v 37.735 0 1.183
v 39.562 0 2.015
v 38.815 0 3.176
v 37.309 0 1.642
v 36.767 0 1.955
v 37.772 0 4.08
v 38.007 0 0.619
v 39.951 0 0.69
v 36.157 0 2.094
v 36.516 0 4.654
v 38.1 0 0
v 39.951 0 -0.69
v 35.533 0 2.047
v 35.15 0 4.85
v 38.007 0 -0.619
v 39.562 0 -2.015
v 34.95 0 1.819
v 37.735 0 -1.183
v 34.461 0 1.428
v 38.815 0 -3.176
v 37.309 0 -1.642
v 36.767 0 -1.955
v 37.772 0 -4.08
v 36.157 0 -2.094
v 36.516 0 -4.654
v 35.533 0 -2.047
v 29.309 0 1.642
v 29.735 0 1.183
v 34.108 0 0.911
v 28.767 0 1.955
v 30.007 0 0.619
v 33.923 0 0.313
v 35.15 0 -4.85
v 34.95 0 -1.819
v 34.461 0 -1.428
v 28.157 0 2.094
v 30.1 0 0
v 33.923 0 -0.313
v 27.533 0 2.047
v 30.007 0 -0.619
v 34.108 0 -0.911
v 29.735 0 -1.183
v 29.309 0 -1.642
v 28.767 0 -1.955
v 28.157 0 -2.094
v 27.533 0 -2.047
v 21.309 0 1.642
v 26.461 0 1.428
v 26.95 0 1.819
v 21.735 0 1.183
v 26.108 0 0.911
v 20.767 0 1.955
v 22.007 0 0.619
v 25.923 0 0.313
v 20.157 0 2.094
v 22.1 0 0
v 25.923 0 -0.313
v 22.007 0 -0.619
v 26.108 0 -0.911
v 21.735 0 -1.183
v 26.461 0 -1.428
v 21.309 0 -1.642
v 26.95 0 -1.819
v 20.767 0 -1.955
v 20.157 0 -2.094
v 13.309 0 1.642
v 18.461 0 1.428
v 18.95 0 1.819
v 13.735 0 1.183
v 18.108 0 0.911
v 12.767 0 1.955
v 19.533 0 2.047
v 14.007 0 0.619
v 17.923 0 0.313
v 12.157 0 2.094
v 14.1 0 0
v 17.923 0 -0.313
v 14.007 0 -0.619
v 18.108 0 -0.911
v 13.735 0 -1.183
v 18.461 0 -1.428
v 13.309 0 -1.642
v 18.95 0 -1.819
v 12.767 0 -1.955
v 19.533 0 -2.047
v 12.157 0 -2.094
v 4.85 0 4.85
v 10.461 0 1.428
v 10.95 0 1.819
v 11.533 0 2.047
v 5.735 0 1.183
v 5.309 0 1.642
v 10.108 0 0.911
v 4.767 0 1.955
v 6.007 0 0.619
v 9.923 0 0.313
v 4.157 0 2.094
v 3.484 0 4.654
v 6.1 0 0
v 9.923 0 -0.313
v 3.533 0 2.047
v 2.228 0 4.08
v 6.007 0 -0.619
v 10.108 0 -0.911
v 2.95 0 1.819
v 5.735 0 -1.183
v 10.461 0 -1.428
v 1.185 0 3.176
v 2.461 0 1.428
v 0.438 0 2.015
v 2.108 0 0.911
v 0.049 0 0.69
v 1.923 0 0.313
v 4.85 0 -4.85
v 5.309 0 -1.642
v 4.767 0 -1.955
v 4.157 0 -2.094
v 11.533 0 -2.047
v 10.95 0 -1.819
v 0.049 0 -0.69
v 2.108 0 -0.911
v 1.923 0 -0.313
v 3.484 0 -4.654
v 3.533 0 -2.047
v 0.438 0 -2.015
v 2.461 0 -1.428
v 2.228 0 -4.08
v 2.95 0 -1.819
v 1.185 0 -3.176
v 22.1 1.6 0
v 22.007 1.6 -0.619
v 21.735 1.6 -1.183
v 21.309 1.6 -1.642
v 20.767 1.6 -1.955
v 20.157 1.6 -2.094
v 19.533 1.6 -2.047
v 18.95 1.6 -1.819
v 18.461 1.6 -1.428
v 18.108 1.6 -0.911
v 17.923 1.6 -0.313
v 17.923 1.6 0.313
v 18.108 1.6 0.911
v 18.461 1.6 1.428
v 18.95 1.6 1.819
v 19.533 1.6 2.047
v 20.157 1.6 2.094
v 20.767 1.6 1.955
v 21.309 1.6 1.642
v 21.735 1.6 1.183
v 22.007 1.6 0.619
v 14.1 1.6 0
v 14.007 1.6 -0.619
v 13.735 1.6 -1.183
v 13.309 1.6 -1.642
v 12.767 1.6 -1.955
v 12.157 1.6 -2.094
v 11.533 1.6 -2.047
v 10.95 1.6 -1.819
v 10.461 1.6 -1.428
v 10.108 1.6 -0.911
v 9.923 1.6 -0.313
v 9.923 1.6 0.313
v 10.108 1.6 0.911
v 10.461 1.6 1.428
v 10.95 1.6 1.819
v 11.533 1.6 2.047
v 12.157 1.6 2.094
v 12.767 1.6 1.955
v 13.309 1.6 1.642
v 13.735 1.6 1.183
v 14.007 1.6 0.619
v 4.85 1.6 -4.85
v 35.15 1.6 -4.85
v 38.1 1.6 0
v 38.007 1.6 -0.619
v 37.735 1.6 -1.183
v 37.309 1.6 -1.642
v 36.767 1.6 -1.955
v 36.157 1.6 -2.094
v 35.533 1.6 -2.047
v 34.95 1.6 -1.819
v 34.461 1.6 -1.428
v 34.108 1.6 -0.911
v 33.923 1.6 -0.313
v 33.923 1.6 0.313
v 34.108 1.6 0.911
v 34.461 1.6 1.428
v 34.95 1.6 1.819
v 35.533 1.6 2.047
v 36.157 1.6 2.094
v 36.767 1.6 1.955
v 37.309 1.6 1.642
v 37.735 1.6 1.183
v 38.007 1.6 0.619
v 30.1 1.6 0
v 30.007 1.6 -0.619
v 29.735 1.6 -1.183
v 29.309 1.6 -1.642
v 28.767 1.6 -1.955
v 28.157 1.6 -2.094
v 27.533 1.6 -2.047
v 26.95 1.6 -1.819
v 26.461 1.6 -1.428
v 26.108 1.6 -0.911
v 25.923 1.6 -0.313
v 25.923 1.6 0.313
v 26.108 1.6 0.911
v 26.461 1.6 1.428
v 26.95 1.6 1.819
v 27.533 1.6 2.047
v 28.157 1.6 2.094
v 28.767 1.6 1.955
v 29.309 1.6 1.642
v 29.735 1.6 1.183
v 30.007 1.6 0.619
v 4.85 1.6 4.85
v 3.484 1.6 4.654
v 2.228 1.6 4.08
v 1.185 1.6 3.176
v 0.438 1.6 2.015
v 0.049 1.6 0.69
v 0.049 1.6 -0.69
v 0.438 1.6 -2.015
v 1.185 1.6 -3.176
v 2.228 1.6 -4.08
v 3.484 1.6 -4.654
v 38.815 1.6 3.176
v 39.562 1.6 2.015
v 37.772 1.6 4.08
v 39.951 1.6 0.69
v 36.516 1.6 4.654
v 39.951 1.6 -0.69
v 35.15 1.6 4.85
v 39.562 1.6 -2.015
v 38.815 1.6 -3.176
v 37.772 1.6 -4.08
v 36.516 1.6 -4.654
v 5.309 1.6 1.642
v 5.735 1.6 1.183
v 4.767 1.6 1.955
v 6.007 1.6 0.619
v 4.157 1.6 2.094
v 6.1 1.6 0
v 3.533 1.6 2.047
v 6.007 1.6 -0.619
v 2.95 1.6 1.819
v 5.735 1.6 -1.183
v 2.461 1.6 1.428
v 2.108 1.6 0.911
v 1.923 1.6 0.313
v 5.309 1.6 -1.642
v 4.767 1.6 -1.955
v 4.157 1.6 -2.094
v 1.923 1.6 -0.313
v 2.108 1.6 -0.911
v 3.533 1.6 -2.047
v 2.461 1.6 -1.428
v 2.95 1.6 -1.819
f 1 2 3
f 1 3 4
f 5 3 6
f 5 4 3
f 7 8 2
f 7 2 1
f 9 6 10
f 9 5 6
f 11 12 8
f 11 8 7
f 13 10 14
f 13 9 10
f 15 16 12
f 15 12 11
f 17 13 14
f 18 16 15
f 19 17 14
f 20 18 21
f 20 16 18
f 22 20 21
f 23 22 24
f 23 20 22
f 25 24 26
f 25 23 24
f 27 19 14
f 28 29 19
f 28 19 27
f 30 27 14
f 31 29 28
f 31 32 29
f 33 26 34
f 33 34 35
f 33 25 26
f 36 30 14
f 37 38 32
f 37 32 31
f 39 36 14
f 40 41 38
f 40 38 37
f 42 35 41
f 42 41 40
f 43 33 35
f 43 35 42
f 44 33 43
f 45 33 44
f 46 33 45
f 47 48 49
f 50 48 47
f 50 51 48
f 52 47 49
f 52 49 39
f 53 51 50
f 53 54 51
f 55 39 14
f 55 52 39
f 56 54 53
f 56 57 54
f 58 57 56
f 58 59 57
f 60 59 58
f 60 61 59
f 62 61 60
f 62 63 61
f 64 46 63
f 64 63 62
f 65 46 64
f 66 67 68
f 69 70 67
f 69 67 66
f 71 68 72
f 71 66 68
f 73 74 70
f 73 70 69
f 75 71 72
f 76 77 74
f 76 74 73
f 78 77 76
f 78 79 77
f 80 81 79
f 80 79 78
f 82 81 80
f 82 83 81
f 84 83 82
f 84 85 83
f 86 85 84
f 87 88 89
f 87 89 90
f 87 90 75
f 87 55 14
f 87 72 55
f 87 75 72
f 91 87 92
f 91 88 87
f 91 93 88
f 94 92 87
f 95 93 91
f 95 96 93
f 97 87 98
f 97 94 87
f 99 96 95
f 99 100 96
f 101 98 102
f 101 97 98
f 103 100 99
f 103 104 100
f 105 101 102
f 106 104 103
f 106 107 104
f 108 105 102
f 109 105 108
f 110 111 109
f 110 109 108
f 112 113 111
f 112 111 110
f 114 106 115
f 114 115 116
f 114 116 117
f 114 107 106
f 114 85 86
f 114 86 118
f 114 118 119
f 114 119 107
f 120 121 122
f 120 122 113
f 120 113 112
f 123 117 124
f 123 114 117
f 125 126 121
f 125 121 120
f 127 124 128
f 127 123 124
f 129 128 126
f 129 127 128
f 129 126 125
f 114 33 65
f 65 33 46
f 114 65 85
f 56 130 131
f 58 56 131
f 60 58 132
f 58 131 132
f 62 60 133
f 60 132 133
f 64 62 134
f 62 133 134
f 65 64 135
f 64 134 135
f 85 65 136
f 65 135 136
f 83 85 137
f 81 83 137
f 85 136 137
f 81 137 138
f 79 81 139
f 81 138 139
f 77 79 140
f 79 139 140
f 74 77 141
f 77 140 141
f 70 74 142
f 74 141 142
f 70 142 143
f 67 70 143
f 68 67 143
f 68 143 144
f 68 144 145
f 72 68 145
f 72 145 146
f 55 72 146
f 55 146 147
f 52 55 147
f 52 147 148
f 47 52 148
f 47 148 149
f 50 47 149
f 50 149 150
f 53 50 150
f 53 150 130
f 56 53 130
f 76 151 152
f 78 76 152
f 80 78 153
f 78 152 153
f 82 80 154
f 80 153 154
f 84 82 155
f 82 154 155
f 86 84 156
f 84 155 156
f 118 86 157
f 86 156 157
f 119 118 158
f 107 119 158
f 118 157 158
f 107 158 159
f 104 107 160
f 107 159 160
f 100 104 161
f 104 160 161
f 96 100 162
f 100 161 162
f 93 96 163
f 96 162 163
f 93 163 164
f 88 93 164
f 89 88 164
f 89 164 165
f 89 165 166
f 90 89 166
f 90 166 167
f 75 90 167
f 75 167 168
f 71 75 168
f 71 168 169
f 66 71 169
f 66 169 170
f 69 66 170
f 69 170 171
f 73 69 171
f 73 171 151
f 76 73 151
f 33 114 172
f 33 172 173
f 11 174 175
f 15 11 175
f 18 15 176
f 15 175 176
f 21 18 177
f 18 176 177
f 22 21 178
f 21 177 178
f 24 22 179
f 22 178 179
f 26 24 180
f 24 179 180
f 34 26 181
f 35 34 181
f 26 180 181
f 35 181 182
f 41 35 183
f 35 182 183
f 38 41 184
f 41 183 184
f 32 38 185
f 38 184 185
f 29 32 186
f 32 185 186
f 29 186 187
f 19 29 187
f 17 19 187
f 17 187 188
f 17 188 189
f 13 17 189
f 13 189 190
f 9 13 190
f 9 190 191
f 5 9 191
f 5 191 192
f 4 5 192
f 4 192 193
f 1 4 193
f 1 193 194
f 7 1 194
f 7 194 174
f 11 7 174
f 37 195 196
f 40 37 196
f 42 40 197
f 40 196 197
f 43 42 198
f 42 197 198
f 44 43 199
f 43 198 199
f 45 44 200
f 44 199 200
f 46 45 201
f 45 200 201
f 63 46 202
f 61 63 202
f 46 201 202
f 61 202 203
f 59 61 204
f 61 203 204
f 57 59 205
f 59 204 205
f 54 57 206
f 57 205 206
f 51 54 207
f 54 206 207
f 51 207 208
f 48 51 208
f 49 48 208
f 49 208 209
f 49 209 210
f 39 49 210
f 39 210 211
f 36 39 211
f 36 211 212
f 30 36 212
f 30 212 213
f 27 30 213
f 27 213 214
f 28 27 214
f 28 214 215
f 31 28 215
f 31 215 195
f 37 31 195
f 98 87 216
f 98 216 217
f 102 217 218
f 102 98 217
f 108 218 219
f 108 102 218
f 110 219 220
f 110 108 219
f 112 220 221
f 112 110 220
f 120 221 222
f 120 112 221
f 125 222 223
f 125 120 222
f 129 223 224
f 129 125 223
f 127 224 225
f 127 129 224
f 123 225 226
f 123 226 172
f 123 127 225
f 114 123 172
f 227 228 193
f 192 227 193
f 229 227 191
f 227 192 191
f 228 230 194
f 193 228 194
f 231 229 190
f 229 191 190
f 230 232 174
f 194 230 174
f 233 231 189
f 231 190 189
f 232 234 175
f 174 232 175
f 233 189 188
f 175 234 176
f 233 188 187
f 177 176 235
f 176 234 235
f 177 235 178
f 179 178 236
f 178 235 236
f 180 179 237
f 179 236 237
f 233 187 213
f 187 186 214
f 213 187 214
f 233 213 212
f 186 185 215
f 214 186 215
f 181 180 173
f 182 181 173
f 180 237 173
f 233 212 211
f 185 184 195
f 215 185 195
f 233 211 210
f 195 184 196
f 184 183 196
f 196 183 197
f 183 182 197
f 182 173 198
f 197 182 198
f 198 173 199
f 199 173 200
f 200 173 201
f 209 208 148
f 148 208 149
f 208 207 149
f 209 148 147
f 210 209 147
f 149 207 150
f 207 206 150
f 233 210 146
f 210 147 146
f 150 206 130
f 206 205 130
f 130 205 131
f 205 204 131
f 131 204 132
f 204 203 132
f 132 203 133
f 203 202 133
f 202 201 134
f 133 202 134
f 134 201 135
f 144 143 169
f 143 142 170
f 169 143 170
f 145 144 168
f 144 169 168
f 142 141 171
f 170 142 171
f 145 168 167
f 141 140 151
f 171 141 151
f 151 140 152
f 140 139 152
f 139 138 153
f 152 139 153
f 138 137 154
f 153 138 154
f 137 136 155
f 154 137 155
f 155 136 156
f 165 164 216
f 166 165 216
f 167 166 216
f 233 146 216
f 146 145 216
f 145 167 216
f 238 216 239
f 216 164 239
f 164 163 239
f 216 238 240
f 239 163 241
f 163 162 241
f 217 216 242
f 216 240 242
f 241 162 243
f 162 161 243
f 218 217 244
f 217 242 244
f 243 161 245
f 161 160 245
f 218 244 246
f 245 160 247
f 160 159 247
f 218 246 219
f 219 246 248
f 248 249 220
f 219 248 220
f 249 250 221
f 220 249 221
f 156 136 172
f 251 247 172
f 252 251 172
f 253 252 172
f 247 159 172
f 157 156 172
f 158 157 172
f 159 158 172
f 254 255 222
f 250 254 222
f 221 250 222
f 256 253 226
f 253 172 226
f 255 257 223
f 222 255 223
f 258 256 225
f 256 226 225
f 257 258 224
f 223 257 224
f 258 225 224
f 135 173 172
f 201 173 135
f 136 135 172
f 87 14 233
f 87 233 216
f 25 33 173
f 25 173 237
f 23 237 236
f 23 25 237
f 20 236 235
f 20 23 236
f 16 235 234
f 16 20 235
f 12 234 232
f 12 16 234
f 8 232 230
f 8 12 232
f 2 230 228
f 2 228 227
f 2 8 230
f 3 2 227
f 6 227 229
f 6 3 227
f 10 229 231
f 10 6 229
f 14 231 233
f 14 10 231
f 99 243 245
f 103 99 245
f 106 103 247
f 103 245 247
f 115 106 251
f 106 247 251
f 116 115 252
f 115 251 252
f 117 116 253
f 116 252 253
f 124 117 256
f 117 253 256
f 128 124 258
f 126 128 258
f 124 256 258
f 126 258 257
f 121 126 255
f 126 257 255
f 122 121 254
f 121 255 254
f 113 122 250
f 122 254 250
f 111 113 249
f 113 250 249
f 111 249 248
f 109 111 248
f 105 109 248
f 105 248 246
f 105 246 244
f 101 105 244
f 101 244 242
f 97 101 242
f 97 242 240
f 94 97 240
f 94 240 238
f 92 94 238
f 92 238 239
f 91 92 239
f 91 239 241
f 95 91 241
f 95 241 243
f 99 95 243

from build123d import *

# Parameters (mm, degrees)
BOSS_EXTRUDE1_DEPTH = 1.6
SKETCH2_R           = 2.1
CUT_EXTRUDE1_DEPTH  = 2.6
LPATTERN1_COUNT     = 5
LPATTERN1_PITCH     = 8


with BuildPart() as part:
    # Sketch1 → Boss-Extrude1 (new body)
    with BuildSketch(Plane(origin=(0, 0, 0), x_dir=(1, 0, 0), z_dir=(0, 1, 0))):
        with BuildLine():
            Line((4.85, 4.85), (35.15, 4.85))
            ThreePointArc((35.15, 4.85), (40, 0), (35.15, -4.85))
            Line((35.15, -4.85), (4.85, -4.85))
            ThreePointArc((4.85, -4.85), (0, 0), (4.85, 4.85))
        make_face()
    extrude(amount=BOSS_EXTRUDE1_DEPTH)

    # Sketch2 → Cut-Extrude1 (cut, through all)
    with BuildSketch(Plane(origin=(0, 1.6, 0), x_dir=(1, 0, 0), z_dir=(0, 1, 0))):
        with Locations((4, 0)):
            Circle(SKETCH2_R)
    cut_extrude1 = extrude(amount=-CUT_EXTRUDE1_DEPTH, mode=Mode.SUBTRACT)

    # LPattern1: Cut-Extrude1 ×5
    with Locations(*[(i * LPATTERN1_PITCH, 0, 0) for i in range(1, LPATTERN1_COUNT)]):
        add(cut_extrude1, mode=Mode.SUBTRACT)


solid = part.part
